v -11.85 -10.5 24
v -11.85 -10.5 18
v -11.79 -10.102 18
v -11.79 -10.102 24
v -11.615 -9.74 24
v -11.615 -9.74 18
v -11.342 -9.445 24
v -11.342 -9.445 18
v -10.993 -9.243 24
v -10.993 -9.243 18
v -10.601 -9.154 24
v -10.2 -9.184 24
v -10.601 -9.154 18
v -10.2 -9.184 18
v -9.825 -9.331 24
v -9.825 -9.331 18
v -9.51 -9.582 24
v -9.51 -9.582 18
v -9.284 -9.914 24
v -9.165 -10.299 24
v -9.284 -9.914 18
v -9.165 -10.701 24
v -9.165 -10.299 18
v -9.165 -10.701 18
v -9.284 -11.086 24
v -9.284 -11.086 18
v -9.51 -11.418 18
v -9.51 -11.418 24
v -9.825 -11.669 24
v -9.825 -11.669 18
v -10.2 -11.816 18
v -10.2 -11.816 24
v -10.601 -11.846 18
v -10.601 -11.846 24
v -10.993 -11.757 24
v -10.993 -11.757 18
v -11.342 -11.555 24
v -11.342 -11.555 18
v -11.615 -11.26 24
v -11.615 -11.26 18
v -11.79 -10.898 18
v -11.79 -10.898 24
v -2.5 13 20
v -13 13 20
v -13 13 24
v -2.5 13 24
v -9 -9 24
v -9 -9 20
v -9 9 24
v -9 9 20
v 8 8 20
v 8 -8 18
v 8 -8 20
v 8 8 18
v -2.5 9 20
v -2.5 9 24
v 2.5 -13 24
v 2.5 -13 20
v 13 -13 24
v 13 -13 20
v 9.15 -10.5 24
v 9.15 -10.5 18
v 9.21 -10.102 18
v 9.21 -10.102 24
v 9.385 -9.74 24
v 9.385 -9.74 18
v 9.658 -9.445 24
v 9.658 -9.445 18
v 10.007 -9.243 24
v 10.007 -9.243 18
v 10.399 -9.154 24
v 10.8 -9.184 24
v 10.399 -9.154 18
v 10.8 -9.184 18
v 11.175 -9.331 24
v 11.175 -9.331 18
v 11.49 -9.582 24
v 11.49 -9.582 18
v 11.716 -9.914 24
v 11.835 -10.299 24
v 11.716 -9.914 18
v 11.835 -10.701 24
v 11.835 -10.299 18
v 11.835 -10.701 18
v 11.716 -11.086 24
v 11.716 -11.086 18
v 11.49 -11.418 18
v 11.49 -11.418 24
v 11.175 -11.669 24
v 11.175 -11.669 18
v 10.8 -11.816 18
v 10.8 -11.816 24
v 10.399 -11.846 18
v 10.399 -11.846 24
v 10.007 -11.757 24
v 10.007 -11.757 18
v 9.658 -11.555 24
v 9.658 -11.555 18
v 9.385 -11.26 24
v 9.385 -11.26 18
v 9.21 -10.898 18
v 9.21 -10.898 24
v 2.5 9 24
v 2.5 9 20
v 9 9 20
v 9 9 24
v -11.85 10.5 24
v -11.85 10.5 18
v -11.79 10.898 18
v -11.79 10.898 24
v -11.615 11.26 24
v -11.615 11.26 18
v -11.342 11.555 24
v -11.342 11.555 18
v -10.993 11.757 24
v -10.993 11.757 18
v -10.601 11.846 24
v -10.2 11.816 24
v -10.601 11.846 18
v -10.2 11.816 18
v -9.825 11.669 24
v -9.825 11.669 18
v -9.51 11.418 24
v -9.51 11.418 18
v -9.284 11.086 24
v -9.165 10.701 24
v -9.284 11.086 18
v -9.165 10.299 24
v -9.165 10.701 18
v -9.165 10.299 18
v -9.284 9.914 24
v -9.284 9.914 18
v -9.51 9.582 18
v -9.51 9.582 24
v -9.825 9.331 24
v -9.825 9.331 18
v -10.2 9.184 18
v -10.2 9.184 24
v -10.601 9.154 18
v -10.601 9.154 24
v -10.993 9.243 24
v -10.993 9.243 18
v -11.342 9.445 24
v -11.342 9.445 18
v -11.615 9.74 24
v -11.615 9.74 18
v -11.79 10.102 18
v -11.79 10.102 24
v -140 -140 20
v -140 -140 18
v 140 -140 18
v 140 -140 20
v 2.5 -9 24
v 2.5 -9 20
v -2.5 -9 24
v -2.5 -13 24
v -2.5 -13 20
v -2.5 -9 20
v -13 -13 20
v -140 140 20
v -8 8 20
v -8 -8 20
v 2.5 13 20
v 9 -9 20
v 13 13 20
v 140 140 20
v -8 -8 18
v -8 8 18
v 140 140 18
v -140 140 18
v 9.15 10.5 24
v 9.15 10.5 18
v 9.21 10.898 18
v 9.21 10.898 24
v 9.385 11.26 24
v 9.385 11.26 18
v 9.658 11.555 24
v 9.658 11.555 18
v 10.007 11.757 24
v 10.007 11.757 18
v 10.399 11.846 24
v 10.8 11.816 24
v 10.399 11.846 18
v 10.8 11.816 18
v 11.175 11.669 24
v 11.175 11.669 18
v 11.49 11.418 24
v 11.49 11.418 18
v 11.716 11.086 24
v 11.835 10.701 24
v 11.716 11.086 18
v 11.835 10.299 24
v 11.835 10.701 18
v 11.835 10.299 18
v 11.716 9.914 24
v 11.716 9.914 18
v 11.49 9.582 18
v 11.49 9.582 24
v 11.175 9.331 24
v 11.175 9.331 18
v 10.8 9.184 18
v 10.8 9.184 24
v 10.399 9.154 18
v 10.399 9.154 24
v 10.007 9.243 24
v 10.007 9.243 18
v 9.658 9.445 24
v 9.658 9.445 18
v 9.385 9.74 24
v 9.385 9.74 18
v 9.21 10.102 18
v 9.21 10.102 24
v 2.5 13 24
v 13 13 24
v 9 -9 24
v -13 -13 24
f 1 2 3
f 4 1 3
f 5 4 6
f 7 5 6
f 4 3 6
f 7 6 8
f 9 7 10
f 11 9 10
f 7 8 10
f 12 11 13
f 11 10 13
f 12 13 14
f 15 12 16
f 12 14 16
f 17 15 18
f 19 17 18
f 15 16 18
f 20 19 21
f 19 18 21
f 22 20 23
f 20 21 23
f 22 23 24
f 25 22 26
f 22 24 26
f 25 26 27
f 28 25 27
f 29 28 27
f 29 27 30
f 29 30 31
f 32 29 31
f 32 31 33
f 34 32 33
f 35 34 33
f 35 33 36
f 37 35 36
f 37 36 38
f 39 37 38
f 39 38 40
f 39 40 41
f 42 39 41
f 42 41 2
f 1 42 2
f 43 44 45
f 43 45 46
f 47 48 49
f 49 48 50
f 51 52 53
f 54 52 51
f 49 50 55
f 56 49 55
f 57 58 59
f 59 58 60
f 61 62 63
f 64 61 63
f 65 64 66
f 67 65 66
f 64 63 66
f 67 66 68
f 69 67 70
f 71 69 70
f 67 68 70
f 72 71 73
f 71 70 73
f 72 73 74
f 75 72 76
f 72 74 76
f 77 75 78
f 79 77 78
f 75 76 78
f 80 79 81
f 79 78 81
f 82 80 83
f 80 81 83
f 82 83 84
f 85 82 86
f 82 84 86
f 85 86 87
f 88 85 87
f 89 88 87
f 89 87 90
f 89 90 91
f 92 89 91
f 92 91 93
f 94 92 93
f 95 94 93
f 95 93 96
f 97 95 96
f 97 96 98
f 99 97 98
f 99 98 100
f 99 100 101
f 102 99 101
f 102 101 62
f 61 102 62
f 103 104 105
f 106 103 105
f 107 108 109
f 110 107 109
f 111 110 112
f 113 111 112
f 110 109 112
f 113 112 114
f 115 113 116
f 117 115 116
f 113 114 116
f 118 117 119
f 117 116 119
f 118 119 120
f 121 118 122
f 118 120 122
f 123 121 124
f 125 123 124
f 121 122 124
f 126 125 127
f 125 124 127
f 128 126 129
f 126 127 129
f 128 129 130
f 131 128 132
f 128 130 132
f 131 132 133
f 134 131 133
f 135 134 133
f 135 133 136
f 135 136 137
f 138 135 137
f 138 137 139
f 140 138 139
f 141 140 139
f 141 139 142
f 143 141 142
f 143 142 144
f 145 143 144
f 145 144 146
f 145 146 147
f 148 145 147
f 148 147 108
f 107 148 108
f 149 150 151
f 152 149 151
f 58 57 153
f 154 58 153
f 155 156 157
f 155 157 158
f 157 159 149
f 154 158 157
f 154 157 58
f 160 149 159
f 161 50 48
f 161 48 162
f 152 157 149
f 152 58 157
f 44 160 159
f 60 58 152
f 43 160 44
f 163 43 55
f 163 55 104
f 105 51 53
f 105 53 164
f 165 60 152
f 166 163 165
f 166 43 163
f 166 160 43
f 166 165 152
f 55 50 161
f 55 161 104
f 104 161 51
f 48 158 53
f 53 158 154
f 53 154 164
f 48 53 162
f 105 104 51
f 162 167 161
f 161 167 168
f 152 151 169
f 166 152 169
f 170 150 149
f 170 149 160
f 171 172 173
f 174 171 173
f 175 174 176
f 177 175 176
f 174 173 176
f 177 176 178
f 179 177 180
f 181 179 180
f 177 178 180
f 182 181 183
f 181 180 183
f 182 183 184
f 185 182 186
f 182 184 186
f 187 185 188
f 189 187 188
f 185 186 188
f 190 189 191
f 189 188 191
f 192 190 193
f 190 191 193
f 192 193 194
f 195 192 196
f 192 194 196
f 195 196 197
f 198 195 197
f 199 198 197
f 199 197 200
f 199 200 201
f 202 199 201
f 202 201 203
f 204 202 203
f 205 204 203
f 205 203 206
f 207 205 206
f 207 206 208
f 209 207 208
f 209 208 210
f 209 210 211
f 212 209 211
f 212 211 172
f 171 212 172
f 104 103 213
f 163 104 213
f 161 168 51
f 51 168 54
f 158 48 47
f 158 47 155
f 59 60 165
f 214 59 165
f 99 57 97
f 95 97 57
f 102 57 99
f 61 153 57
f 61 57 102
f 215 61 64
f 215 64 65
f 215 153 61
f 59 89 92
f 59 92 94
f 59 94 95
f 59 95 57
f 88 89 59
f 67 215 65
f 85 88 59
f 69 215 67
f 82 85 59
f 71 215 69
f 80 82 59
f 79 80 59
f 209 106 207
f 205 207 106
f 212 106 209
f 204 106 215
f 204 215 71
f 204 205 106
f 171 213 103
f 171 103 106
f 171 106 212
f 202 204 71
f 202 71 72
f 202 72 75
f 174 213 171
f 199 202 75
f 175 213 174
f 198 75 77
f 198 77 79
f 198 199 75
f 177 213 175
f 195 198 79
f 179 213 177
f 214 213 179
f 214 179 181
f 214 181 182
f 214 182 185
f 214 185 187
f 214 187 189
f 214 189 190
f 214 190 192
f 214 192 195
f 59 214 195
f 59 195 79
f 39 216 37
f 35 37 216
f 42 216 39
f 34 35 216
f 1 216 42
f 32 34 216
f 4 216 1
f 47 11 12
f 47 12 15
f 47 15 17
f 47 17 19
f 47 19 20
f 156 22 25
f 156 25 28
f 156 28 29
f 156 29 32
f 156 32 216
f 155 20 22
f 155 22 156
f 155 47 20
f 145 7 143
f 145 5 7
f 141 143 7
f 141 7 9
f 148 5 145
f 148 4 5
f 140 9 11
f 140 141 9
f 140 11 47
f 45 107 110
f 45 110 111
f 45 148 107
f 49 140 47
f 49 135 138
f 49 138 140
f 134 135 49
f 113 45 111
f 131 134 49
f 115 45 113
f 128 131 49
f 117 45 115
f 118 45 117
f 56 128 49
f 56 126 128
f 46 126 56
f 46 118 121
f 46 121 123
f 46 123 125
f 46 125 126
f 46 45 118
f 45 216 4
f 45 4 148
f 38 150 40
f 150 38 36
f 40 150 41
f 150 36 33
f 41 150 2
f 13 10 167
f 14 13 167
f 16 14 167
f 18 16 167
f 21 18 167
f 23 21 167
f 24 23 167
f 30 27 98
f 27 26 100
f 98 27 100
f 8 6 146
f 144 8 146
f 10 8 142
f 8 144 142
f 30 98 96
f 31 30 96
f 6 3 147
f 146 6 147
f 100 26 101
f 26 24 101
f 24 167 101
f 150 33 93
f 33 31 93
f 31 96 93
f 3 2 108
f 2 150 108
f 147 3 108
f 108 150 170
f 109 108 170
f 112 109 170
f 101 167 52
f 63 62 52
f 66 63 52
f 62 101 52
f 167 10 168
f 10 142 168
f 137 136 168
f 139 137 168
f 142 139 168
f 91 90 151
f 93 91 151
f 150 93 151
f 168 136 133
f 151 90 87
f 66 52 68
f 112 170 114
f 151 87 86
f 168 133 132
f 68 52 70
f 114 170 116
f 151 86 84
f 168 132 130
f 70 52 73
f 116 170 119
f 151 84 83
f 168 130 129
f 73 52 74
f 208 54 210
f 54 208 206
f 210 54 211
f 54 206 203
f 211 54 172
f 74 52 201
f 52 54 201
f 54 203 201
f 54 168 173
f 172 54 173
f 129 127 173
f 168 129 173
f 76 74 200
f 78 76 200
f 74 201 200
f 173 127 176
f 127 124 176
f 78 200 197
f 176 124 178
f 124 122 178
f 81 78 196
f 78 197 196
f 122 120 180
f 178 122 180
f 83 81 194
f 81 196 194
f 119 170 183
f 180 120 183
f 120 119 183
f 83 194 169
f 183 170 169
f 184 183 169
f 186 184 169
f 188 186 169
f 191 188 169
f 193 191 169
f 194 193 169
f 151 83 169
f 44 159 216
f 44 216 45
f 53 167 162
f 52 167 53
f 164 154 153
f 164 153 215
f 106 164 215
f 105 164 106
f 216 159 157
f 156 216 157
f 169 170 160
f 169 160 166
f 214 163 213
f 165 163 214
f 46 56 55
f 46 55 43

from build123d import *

# Parameters (mm, degrees)
F0_W      = 280
F0_H      = 280
F0_W_2    = 50
F0_H_2    = 50
F1_DEPTH  = 18
F2_DEPTH  = 2
F3_W      = 16
F3_H      = 6
F4_DEPTH  = 115
F5_W      = 280
F5_H      = 280
F5_W_2    = 50
F5_H_2    = 50
F5_W_3    = 16
F5_H_3    = 16
F6_DEPTH  = 2
F7_W      = 26
F7_H      = 26
F7_W_2    = 18
F7_H_2    = 18
F8_DEPTH  = 4
F10_D     = 2.7
F10_DEPTH = 8
F10_TIP   = 0.8111618357
F9_W      = 5
F9_H      = 4
F11_DEPTH = 4


with BuildPart() as f1:
    # F0 (on Top) → F1 (new body)
    with BuildSketch(Plane.XY):
        Rectangle(F0_W, F0_H)
        Rectangle(F0_W_2, F0_H_2, mode=Mode.SUBTRACT)
    extrude(amount=F1_DEPTH)

    # F0 (on Top) → F2 (join)
    with BuildSketch(Plane.XY):
        Rectangle(F0_W, F0_H)
        Rectangle(F0_W_2, F0_H_2, mode=Mode.SUBTRACT)
        Rectangle(F0_W_2, F0_H_2)
    extrude(amount=-F2_DEPTH)

    # F3 (on face) → F4 (cut, through all)
    with BuildSketch(Plane.YZ.offset(140)):
        with Locations((0.0201961273, 3)):
            Rectangle(F3_W, F3_H)
    extrude(amount=-F4_DEPTH, mode=Mode.SUBTRACT)


with BuildPart() as f6:
    # F5 (on face) → F6 (new body)
    with BuildSketch(Plane.XY.offset(18)):
        Rectangle(F5_W, F5_H)
        Rectangle(F5_W_2, F5_H_2, mode=Mode.SUBTRACT)
        Rectangle(F5_W_2, F5_H_2)
        Rectangle(F5_W_3, F5_H_3, mode=Mode.SUBTRACT)
    extrude(amount=F6_DEPTH)

    # F7 (on face) → F8 (join)
    with BuildSketch(Plane.XY.offset(20)):
        Rectangle(F7_W, F7_H)
        Rectangle(F7_W_2, F7_H_2, mode=Mode.SUBTRACT)
    extrude(amount=F8_DEPTH)

    # F10
    with Locations(Plane.XY.offset(24)):
        with Locations((-10.5, 10.5), (10.5, 10.5), (-10.5, -10.5), (10.5, -10.5)):
            Hole(F10_D / 2, depth=F10_DEPTH)
            with Locations((0, 0, -(F10_DEPTH + F10_TIP / 2))):  # 118° drill point
                Cone(0, F10_D / 2, F10_TIP, mode=Mode.SUBTRACT)

    # F9 (on face) → F11 (cut, through all)
    with BuildSketch(Plane.XY.offset(24)):
        with Locations((0, 11)):
            Rectangle(F9_W, F9_H)
        with Locations((0, -11)):
            Rectangle(F9_W, F9_H)
    extrude(amount=-F11_DEPTH, mode=Mode.SUBTRACT)


solid = f6.part
